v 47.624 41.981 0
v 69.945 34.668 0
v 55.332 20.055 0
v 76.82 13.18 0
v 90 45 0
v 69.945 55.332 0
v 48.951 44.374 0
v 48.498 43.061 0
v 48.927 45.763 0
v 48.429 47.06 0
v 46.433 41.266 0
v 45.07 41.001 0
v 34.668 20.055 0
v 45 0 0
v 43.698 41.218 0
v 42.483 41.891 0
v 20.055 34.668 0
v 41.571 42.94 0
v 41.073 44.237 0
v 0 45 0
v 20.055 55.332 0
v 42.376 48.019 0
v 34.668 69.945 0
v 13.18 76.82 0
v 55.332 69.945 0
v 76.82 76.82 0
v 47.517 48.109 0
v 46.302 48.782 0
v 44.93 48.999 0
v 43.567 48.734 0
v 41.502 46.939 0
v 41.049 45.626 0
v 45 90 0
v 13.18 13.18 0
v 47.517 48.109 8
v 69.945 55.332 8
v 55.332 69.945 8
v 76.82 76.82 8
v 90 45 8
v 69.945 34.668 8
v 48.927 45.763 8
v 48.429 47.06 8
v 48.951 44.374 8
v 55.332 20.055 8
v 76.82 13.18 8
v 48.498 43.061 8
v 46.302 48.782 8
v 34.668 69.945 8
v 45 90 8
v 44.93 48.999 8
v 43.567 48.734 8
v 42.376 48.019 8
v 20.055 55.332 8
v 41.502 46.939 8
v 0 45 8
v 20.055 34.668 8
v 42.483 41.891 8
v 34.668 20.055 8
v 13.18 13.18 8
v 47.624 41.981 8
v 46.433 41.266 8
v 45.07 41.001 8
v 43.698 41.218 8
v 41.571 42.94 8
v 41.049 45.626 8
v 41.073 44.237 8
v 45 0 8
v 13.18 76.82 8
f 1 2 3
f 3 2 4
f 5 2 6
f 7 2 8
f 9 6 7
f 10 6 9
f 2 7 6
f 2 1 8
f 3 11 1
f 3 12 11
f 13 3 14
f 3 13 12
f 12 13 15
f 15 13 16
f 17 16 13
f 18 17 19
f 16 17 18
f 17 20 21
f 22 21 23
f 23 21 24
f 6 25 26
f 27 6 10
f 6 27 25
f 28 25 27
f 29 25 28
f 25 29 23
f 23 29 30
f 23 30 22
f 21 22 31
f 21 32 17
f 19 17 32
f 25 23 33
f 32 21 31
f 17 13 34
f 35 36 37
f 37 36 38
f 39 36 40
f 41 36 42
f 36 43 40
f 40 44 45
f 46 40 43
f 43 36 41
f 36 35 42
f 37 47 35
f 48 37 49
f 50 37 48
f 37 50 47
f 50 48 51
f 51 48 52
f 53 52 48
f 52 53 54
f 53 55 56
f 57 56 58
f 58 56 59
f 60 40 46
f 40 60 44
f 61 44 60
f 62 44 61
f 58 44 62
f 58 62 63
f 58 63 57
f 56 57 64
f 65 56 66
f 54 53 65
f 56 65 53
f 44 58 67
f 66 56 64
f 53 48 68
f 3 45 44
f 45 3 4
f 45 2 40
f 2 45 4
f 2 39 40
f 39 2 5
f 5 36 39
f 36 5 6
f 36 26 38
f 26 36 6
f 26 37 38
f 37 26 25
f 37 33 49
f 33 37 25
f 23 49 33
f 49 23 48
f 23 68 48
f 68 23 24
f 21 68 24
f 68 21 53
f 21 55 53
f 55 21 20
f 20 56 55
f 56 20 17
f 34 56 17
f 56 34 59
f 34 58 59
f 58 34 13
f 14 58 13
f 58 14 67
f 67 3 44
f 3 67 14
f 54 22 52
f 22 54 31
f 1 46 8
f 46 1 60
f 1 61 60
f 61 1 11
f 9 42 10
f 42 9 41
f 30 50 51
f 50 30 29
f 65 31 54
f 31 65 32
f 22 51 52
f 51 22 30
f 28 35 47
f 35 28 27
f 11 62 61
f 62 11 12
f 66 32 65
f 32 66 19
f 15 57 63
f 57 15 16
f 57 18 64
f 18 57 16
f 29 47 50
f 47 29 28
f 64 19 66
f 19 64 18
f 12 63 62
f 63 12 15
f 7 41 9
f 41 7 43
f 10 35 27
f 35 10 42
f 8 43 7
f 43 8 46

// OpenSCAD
$fn = 32;

// ----------------------------------------------------------------------
// Star wheel: 8-point star, R45
// ----------------------------------------------------------------------

// --- parameters (mm) ---
n_points = 8;             // number of points / teeth
r_out = 45;               // tip radius
r_in = 27;                // root radius
bore_r = 4;               // centre bore radius
plate_t = 8;              // plate thickness, Z (extrusion height)
bore_d = 8;               // centre bore diameter
fit_tol = 0.05;           // declared fit tolerance (prompt contract)
free_tol = 0.2;           // declared free tolerance (prompt contract)

profile = [[0, 45], [20.055, 34.668], [13.18, 13.18], [34.668, 20.055], [45, 0], [55.332, 20.055], [76.82, 13.18], [69.945, 34.668], [90, 45], [69.945, 55.332], [76.82, 76.82], [55.332, 69.945], [45, 90], [34.668, 69.945], [13.18, 76.82], [20.055, 55.332]];  // primary outline, 16 points, counter clockwise
void_1 = [[48.927, 45.763], [48.429, 47.06], [47.517, 48.109], [46.302, 48.782], [44.93, 48.999], [43.567, 48.734], [42.376, 48.019], [41.502, 46.939], [41.049, 45.626], [41.073, 44.237], [41.571, 42.94], [42.483, 41.891], [43.698, 41.218], [45.07, 41.001], [46.433, 41.266], [47.624, 41.981], [48.498, 43.061], [48.951, 44.374]];  // centre bore, 18 points

// --- the one profile operation ---
difference() {
  linear_extrude(height = plate_t) polygon(points = profile);
  translate([0, 0, -1])
    linear_extrude(height = plate_t + 2) polygon(points = void_1);
}
